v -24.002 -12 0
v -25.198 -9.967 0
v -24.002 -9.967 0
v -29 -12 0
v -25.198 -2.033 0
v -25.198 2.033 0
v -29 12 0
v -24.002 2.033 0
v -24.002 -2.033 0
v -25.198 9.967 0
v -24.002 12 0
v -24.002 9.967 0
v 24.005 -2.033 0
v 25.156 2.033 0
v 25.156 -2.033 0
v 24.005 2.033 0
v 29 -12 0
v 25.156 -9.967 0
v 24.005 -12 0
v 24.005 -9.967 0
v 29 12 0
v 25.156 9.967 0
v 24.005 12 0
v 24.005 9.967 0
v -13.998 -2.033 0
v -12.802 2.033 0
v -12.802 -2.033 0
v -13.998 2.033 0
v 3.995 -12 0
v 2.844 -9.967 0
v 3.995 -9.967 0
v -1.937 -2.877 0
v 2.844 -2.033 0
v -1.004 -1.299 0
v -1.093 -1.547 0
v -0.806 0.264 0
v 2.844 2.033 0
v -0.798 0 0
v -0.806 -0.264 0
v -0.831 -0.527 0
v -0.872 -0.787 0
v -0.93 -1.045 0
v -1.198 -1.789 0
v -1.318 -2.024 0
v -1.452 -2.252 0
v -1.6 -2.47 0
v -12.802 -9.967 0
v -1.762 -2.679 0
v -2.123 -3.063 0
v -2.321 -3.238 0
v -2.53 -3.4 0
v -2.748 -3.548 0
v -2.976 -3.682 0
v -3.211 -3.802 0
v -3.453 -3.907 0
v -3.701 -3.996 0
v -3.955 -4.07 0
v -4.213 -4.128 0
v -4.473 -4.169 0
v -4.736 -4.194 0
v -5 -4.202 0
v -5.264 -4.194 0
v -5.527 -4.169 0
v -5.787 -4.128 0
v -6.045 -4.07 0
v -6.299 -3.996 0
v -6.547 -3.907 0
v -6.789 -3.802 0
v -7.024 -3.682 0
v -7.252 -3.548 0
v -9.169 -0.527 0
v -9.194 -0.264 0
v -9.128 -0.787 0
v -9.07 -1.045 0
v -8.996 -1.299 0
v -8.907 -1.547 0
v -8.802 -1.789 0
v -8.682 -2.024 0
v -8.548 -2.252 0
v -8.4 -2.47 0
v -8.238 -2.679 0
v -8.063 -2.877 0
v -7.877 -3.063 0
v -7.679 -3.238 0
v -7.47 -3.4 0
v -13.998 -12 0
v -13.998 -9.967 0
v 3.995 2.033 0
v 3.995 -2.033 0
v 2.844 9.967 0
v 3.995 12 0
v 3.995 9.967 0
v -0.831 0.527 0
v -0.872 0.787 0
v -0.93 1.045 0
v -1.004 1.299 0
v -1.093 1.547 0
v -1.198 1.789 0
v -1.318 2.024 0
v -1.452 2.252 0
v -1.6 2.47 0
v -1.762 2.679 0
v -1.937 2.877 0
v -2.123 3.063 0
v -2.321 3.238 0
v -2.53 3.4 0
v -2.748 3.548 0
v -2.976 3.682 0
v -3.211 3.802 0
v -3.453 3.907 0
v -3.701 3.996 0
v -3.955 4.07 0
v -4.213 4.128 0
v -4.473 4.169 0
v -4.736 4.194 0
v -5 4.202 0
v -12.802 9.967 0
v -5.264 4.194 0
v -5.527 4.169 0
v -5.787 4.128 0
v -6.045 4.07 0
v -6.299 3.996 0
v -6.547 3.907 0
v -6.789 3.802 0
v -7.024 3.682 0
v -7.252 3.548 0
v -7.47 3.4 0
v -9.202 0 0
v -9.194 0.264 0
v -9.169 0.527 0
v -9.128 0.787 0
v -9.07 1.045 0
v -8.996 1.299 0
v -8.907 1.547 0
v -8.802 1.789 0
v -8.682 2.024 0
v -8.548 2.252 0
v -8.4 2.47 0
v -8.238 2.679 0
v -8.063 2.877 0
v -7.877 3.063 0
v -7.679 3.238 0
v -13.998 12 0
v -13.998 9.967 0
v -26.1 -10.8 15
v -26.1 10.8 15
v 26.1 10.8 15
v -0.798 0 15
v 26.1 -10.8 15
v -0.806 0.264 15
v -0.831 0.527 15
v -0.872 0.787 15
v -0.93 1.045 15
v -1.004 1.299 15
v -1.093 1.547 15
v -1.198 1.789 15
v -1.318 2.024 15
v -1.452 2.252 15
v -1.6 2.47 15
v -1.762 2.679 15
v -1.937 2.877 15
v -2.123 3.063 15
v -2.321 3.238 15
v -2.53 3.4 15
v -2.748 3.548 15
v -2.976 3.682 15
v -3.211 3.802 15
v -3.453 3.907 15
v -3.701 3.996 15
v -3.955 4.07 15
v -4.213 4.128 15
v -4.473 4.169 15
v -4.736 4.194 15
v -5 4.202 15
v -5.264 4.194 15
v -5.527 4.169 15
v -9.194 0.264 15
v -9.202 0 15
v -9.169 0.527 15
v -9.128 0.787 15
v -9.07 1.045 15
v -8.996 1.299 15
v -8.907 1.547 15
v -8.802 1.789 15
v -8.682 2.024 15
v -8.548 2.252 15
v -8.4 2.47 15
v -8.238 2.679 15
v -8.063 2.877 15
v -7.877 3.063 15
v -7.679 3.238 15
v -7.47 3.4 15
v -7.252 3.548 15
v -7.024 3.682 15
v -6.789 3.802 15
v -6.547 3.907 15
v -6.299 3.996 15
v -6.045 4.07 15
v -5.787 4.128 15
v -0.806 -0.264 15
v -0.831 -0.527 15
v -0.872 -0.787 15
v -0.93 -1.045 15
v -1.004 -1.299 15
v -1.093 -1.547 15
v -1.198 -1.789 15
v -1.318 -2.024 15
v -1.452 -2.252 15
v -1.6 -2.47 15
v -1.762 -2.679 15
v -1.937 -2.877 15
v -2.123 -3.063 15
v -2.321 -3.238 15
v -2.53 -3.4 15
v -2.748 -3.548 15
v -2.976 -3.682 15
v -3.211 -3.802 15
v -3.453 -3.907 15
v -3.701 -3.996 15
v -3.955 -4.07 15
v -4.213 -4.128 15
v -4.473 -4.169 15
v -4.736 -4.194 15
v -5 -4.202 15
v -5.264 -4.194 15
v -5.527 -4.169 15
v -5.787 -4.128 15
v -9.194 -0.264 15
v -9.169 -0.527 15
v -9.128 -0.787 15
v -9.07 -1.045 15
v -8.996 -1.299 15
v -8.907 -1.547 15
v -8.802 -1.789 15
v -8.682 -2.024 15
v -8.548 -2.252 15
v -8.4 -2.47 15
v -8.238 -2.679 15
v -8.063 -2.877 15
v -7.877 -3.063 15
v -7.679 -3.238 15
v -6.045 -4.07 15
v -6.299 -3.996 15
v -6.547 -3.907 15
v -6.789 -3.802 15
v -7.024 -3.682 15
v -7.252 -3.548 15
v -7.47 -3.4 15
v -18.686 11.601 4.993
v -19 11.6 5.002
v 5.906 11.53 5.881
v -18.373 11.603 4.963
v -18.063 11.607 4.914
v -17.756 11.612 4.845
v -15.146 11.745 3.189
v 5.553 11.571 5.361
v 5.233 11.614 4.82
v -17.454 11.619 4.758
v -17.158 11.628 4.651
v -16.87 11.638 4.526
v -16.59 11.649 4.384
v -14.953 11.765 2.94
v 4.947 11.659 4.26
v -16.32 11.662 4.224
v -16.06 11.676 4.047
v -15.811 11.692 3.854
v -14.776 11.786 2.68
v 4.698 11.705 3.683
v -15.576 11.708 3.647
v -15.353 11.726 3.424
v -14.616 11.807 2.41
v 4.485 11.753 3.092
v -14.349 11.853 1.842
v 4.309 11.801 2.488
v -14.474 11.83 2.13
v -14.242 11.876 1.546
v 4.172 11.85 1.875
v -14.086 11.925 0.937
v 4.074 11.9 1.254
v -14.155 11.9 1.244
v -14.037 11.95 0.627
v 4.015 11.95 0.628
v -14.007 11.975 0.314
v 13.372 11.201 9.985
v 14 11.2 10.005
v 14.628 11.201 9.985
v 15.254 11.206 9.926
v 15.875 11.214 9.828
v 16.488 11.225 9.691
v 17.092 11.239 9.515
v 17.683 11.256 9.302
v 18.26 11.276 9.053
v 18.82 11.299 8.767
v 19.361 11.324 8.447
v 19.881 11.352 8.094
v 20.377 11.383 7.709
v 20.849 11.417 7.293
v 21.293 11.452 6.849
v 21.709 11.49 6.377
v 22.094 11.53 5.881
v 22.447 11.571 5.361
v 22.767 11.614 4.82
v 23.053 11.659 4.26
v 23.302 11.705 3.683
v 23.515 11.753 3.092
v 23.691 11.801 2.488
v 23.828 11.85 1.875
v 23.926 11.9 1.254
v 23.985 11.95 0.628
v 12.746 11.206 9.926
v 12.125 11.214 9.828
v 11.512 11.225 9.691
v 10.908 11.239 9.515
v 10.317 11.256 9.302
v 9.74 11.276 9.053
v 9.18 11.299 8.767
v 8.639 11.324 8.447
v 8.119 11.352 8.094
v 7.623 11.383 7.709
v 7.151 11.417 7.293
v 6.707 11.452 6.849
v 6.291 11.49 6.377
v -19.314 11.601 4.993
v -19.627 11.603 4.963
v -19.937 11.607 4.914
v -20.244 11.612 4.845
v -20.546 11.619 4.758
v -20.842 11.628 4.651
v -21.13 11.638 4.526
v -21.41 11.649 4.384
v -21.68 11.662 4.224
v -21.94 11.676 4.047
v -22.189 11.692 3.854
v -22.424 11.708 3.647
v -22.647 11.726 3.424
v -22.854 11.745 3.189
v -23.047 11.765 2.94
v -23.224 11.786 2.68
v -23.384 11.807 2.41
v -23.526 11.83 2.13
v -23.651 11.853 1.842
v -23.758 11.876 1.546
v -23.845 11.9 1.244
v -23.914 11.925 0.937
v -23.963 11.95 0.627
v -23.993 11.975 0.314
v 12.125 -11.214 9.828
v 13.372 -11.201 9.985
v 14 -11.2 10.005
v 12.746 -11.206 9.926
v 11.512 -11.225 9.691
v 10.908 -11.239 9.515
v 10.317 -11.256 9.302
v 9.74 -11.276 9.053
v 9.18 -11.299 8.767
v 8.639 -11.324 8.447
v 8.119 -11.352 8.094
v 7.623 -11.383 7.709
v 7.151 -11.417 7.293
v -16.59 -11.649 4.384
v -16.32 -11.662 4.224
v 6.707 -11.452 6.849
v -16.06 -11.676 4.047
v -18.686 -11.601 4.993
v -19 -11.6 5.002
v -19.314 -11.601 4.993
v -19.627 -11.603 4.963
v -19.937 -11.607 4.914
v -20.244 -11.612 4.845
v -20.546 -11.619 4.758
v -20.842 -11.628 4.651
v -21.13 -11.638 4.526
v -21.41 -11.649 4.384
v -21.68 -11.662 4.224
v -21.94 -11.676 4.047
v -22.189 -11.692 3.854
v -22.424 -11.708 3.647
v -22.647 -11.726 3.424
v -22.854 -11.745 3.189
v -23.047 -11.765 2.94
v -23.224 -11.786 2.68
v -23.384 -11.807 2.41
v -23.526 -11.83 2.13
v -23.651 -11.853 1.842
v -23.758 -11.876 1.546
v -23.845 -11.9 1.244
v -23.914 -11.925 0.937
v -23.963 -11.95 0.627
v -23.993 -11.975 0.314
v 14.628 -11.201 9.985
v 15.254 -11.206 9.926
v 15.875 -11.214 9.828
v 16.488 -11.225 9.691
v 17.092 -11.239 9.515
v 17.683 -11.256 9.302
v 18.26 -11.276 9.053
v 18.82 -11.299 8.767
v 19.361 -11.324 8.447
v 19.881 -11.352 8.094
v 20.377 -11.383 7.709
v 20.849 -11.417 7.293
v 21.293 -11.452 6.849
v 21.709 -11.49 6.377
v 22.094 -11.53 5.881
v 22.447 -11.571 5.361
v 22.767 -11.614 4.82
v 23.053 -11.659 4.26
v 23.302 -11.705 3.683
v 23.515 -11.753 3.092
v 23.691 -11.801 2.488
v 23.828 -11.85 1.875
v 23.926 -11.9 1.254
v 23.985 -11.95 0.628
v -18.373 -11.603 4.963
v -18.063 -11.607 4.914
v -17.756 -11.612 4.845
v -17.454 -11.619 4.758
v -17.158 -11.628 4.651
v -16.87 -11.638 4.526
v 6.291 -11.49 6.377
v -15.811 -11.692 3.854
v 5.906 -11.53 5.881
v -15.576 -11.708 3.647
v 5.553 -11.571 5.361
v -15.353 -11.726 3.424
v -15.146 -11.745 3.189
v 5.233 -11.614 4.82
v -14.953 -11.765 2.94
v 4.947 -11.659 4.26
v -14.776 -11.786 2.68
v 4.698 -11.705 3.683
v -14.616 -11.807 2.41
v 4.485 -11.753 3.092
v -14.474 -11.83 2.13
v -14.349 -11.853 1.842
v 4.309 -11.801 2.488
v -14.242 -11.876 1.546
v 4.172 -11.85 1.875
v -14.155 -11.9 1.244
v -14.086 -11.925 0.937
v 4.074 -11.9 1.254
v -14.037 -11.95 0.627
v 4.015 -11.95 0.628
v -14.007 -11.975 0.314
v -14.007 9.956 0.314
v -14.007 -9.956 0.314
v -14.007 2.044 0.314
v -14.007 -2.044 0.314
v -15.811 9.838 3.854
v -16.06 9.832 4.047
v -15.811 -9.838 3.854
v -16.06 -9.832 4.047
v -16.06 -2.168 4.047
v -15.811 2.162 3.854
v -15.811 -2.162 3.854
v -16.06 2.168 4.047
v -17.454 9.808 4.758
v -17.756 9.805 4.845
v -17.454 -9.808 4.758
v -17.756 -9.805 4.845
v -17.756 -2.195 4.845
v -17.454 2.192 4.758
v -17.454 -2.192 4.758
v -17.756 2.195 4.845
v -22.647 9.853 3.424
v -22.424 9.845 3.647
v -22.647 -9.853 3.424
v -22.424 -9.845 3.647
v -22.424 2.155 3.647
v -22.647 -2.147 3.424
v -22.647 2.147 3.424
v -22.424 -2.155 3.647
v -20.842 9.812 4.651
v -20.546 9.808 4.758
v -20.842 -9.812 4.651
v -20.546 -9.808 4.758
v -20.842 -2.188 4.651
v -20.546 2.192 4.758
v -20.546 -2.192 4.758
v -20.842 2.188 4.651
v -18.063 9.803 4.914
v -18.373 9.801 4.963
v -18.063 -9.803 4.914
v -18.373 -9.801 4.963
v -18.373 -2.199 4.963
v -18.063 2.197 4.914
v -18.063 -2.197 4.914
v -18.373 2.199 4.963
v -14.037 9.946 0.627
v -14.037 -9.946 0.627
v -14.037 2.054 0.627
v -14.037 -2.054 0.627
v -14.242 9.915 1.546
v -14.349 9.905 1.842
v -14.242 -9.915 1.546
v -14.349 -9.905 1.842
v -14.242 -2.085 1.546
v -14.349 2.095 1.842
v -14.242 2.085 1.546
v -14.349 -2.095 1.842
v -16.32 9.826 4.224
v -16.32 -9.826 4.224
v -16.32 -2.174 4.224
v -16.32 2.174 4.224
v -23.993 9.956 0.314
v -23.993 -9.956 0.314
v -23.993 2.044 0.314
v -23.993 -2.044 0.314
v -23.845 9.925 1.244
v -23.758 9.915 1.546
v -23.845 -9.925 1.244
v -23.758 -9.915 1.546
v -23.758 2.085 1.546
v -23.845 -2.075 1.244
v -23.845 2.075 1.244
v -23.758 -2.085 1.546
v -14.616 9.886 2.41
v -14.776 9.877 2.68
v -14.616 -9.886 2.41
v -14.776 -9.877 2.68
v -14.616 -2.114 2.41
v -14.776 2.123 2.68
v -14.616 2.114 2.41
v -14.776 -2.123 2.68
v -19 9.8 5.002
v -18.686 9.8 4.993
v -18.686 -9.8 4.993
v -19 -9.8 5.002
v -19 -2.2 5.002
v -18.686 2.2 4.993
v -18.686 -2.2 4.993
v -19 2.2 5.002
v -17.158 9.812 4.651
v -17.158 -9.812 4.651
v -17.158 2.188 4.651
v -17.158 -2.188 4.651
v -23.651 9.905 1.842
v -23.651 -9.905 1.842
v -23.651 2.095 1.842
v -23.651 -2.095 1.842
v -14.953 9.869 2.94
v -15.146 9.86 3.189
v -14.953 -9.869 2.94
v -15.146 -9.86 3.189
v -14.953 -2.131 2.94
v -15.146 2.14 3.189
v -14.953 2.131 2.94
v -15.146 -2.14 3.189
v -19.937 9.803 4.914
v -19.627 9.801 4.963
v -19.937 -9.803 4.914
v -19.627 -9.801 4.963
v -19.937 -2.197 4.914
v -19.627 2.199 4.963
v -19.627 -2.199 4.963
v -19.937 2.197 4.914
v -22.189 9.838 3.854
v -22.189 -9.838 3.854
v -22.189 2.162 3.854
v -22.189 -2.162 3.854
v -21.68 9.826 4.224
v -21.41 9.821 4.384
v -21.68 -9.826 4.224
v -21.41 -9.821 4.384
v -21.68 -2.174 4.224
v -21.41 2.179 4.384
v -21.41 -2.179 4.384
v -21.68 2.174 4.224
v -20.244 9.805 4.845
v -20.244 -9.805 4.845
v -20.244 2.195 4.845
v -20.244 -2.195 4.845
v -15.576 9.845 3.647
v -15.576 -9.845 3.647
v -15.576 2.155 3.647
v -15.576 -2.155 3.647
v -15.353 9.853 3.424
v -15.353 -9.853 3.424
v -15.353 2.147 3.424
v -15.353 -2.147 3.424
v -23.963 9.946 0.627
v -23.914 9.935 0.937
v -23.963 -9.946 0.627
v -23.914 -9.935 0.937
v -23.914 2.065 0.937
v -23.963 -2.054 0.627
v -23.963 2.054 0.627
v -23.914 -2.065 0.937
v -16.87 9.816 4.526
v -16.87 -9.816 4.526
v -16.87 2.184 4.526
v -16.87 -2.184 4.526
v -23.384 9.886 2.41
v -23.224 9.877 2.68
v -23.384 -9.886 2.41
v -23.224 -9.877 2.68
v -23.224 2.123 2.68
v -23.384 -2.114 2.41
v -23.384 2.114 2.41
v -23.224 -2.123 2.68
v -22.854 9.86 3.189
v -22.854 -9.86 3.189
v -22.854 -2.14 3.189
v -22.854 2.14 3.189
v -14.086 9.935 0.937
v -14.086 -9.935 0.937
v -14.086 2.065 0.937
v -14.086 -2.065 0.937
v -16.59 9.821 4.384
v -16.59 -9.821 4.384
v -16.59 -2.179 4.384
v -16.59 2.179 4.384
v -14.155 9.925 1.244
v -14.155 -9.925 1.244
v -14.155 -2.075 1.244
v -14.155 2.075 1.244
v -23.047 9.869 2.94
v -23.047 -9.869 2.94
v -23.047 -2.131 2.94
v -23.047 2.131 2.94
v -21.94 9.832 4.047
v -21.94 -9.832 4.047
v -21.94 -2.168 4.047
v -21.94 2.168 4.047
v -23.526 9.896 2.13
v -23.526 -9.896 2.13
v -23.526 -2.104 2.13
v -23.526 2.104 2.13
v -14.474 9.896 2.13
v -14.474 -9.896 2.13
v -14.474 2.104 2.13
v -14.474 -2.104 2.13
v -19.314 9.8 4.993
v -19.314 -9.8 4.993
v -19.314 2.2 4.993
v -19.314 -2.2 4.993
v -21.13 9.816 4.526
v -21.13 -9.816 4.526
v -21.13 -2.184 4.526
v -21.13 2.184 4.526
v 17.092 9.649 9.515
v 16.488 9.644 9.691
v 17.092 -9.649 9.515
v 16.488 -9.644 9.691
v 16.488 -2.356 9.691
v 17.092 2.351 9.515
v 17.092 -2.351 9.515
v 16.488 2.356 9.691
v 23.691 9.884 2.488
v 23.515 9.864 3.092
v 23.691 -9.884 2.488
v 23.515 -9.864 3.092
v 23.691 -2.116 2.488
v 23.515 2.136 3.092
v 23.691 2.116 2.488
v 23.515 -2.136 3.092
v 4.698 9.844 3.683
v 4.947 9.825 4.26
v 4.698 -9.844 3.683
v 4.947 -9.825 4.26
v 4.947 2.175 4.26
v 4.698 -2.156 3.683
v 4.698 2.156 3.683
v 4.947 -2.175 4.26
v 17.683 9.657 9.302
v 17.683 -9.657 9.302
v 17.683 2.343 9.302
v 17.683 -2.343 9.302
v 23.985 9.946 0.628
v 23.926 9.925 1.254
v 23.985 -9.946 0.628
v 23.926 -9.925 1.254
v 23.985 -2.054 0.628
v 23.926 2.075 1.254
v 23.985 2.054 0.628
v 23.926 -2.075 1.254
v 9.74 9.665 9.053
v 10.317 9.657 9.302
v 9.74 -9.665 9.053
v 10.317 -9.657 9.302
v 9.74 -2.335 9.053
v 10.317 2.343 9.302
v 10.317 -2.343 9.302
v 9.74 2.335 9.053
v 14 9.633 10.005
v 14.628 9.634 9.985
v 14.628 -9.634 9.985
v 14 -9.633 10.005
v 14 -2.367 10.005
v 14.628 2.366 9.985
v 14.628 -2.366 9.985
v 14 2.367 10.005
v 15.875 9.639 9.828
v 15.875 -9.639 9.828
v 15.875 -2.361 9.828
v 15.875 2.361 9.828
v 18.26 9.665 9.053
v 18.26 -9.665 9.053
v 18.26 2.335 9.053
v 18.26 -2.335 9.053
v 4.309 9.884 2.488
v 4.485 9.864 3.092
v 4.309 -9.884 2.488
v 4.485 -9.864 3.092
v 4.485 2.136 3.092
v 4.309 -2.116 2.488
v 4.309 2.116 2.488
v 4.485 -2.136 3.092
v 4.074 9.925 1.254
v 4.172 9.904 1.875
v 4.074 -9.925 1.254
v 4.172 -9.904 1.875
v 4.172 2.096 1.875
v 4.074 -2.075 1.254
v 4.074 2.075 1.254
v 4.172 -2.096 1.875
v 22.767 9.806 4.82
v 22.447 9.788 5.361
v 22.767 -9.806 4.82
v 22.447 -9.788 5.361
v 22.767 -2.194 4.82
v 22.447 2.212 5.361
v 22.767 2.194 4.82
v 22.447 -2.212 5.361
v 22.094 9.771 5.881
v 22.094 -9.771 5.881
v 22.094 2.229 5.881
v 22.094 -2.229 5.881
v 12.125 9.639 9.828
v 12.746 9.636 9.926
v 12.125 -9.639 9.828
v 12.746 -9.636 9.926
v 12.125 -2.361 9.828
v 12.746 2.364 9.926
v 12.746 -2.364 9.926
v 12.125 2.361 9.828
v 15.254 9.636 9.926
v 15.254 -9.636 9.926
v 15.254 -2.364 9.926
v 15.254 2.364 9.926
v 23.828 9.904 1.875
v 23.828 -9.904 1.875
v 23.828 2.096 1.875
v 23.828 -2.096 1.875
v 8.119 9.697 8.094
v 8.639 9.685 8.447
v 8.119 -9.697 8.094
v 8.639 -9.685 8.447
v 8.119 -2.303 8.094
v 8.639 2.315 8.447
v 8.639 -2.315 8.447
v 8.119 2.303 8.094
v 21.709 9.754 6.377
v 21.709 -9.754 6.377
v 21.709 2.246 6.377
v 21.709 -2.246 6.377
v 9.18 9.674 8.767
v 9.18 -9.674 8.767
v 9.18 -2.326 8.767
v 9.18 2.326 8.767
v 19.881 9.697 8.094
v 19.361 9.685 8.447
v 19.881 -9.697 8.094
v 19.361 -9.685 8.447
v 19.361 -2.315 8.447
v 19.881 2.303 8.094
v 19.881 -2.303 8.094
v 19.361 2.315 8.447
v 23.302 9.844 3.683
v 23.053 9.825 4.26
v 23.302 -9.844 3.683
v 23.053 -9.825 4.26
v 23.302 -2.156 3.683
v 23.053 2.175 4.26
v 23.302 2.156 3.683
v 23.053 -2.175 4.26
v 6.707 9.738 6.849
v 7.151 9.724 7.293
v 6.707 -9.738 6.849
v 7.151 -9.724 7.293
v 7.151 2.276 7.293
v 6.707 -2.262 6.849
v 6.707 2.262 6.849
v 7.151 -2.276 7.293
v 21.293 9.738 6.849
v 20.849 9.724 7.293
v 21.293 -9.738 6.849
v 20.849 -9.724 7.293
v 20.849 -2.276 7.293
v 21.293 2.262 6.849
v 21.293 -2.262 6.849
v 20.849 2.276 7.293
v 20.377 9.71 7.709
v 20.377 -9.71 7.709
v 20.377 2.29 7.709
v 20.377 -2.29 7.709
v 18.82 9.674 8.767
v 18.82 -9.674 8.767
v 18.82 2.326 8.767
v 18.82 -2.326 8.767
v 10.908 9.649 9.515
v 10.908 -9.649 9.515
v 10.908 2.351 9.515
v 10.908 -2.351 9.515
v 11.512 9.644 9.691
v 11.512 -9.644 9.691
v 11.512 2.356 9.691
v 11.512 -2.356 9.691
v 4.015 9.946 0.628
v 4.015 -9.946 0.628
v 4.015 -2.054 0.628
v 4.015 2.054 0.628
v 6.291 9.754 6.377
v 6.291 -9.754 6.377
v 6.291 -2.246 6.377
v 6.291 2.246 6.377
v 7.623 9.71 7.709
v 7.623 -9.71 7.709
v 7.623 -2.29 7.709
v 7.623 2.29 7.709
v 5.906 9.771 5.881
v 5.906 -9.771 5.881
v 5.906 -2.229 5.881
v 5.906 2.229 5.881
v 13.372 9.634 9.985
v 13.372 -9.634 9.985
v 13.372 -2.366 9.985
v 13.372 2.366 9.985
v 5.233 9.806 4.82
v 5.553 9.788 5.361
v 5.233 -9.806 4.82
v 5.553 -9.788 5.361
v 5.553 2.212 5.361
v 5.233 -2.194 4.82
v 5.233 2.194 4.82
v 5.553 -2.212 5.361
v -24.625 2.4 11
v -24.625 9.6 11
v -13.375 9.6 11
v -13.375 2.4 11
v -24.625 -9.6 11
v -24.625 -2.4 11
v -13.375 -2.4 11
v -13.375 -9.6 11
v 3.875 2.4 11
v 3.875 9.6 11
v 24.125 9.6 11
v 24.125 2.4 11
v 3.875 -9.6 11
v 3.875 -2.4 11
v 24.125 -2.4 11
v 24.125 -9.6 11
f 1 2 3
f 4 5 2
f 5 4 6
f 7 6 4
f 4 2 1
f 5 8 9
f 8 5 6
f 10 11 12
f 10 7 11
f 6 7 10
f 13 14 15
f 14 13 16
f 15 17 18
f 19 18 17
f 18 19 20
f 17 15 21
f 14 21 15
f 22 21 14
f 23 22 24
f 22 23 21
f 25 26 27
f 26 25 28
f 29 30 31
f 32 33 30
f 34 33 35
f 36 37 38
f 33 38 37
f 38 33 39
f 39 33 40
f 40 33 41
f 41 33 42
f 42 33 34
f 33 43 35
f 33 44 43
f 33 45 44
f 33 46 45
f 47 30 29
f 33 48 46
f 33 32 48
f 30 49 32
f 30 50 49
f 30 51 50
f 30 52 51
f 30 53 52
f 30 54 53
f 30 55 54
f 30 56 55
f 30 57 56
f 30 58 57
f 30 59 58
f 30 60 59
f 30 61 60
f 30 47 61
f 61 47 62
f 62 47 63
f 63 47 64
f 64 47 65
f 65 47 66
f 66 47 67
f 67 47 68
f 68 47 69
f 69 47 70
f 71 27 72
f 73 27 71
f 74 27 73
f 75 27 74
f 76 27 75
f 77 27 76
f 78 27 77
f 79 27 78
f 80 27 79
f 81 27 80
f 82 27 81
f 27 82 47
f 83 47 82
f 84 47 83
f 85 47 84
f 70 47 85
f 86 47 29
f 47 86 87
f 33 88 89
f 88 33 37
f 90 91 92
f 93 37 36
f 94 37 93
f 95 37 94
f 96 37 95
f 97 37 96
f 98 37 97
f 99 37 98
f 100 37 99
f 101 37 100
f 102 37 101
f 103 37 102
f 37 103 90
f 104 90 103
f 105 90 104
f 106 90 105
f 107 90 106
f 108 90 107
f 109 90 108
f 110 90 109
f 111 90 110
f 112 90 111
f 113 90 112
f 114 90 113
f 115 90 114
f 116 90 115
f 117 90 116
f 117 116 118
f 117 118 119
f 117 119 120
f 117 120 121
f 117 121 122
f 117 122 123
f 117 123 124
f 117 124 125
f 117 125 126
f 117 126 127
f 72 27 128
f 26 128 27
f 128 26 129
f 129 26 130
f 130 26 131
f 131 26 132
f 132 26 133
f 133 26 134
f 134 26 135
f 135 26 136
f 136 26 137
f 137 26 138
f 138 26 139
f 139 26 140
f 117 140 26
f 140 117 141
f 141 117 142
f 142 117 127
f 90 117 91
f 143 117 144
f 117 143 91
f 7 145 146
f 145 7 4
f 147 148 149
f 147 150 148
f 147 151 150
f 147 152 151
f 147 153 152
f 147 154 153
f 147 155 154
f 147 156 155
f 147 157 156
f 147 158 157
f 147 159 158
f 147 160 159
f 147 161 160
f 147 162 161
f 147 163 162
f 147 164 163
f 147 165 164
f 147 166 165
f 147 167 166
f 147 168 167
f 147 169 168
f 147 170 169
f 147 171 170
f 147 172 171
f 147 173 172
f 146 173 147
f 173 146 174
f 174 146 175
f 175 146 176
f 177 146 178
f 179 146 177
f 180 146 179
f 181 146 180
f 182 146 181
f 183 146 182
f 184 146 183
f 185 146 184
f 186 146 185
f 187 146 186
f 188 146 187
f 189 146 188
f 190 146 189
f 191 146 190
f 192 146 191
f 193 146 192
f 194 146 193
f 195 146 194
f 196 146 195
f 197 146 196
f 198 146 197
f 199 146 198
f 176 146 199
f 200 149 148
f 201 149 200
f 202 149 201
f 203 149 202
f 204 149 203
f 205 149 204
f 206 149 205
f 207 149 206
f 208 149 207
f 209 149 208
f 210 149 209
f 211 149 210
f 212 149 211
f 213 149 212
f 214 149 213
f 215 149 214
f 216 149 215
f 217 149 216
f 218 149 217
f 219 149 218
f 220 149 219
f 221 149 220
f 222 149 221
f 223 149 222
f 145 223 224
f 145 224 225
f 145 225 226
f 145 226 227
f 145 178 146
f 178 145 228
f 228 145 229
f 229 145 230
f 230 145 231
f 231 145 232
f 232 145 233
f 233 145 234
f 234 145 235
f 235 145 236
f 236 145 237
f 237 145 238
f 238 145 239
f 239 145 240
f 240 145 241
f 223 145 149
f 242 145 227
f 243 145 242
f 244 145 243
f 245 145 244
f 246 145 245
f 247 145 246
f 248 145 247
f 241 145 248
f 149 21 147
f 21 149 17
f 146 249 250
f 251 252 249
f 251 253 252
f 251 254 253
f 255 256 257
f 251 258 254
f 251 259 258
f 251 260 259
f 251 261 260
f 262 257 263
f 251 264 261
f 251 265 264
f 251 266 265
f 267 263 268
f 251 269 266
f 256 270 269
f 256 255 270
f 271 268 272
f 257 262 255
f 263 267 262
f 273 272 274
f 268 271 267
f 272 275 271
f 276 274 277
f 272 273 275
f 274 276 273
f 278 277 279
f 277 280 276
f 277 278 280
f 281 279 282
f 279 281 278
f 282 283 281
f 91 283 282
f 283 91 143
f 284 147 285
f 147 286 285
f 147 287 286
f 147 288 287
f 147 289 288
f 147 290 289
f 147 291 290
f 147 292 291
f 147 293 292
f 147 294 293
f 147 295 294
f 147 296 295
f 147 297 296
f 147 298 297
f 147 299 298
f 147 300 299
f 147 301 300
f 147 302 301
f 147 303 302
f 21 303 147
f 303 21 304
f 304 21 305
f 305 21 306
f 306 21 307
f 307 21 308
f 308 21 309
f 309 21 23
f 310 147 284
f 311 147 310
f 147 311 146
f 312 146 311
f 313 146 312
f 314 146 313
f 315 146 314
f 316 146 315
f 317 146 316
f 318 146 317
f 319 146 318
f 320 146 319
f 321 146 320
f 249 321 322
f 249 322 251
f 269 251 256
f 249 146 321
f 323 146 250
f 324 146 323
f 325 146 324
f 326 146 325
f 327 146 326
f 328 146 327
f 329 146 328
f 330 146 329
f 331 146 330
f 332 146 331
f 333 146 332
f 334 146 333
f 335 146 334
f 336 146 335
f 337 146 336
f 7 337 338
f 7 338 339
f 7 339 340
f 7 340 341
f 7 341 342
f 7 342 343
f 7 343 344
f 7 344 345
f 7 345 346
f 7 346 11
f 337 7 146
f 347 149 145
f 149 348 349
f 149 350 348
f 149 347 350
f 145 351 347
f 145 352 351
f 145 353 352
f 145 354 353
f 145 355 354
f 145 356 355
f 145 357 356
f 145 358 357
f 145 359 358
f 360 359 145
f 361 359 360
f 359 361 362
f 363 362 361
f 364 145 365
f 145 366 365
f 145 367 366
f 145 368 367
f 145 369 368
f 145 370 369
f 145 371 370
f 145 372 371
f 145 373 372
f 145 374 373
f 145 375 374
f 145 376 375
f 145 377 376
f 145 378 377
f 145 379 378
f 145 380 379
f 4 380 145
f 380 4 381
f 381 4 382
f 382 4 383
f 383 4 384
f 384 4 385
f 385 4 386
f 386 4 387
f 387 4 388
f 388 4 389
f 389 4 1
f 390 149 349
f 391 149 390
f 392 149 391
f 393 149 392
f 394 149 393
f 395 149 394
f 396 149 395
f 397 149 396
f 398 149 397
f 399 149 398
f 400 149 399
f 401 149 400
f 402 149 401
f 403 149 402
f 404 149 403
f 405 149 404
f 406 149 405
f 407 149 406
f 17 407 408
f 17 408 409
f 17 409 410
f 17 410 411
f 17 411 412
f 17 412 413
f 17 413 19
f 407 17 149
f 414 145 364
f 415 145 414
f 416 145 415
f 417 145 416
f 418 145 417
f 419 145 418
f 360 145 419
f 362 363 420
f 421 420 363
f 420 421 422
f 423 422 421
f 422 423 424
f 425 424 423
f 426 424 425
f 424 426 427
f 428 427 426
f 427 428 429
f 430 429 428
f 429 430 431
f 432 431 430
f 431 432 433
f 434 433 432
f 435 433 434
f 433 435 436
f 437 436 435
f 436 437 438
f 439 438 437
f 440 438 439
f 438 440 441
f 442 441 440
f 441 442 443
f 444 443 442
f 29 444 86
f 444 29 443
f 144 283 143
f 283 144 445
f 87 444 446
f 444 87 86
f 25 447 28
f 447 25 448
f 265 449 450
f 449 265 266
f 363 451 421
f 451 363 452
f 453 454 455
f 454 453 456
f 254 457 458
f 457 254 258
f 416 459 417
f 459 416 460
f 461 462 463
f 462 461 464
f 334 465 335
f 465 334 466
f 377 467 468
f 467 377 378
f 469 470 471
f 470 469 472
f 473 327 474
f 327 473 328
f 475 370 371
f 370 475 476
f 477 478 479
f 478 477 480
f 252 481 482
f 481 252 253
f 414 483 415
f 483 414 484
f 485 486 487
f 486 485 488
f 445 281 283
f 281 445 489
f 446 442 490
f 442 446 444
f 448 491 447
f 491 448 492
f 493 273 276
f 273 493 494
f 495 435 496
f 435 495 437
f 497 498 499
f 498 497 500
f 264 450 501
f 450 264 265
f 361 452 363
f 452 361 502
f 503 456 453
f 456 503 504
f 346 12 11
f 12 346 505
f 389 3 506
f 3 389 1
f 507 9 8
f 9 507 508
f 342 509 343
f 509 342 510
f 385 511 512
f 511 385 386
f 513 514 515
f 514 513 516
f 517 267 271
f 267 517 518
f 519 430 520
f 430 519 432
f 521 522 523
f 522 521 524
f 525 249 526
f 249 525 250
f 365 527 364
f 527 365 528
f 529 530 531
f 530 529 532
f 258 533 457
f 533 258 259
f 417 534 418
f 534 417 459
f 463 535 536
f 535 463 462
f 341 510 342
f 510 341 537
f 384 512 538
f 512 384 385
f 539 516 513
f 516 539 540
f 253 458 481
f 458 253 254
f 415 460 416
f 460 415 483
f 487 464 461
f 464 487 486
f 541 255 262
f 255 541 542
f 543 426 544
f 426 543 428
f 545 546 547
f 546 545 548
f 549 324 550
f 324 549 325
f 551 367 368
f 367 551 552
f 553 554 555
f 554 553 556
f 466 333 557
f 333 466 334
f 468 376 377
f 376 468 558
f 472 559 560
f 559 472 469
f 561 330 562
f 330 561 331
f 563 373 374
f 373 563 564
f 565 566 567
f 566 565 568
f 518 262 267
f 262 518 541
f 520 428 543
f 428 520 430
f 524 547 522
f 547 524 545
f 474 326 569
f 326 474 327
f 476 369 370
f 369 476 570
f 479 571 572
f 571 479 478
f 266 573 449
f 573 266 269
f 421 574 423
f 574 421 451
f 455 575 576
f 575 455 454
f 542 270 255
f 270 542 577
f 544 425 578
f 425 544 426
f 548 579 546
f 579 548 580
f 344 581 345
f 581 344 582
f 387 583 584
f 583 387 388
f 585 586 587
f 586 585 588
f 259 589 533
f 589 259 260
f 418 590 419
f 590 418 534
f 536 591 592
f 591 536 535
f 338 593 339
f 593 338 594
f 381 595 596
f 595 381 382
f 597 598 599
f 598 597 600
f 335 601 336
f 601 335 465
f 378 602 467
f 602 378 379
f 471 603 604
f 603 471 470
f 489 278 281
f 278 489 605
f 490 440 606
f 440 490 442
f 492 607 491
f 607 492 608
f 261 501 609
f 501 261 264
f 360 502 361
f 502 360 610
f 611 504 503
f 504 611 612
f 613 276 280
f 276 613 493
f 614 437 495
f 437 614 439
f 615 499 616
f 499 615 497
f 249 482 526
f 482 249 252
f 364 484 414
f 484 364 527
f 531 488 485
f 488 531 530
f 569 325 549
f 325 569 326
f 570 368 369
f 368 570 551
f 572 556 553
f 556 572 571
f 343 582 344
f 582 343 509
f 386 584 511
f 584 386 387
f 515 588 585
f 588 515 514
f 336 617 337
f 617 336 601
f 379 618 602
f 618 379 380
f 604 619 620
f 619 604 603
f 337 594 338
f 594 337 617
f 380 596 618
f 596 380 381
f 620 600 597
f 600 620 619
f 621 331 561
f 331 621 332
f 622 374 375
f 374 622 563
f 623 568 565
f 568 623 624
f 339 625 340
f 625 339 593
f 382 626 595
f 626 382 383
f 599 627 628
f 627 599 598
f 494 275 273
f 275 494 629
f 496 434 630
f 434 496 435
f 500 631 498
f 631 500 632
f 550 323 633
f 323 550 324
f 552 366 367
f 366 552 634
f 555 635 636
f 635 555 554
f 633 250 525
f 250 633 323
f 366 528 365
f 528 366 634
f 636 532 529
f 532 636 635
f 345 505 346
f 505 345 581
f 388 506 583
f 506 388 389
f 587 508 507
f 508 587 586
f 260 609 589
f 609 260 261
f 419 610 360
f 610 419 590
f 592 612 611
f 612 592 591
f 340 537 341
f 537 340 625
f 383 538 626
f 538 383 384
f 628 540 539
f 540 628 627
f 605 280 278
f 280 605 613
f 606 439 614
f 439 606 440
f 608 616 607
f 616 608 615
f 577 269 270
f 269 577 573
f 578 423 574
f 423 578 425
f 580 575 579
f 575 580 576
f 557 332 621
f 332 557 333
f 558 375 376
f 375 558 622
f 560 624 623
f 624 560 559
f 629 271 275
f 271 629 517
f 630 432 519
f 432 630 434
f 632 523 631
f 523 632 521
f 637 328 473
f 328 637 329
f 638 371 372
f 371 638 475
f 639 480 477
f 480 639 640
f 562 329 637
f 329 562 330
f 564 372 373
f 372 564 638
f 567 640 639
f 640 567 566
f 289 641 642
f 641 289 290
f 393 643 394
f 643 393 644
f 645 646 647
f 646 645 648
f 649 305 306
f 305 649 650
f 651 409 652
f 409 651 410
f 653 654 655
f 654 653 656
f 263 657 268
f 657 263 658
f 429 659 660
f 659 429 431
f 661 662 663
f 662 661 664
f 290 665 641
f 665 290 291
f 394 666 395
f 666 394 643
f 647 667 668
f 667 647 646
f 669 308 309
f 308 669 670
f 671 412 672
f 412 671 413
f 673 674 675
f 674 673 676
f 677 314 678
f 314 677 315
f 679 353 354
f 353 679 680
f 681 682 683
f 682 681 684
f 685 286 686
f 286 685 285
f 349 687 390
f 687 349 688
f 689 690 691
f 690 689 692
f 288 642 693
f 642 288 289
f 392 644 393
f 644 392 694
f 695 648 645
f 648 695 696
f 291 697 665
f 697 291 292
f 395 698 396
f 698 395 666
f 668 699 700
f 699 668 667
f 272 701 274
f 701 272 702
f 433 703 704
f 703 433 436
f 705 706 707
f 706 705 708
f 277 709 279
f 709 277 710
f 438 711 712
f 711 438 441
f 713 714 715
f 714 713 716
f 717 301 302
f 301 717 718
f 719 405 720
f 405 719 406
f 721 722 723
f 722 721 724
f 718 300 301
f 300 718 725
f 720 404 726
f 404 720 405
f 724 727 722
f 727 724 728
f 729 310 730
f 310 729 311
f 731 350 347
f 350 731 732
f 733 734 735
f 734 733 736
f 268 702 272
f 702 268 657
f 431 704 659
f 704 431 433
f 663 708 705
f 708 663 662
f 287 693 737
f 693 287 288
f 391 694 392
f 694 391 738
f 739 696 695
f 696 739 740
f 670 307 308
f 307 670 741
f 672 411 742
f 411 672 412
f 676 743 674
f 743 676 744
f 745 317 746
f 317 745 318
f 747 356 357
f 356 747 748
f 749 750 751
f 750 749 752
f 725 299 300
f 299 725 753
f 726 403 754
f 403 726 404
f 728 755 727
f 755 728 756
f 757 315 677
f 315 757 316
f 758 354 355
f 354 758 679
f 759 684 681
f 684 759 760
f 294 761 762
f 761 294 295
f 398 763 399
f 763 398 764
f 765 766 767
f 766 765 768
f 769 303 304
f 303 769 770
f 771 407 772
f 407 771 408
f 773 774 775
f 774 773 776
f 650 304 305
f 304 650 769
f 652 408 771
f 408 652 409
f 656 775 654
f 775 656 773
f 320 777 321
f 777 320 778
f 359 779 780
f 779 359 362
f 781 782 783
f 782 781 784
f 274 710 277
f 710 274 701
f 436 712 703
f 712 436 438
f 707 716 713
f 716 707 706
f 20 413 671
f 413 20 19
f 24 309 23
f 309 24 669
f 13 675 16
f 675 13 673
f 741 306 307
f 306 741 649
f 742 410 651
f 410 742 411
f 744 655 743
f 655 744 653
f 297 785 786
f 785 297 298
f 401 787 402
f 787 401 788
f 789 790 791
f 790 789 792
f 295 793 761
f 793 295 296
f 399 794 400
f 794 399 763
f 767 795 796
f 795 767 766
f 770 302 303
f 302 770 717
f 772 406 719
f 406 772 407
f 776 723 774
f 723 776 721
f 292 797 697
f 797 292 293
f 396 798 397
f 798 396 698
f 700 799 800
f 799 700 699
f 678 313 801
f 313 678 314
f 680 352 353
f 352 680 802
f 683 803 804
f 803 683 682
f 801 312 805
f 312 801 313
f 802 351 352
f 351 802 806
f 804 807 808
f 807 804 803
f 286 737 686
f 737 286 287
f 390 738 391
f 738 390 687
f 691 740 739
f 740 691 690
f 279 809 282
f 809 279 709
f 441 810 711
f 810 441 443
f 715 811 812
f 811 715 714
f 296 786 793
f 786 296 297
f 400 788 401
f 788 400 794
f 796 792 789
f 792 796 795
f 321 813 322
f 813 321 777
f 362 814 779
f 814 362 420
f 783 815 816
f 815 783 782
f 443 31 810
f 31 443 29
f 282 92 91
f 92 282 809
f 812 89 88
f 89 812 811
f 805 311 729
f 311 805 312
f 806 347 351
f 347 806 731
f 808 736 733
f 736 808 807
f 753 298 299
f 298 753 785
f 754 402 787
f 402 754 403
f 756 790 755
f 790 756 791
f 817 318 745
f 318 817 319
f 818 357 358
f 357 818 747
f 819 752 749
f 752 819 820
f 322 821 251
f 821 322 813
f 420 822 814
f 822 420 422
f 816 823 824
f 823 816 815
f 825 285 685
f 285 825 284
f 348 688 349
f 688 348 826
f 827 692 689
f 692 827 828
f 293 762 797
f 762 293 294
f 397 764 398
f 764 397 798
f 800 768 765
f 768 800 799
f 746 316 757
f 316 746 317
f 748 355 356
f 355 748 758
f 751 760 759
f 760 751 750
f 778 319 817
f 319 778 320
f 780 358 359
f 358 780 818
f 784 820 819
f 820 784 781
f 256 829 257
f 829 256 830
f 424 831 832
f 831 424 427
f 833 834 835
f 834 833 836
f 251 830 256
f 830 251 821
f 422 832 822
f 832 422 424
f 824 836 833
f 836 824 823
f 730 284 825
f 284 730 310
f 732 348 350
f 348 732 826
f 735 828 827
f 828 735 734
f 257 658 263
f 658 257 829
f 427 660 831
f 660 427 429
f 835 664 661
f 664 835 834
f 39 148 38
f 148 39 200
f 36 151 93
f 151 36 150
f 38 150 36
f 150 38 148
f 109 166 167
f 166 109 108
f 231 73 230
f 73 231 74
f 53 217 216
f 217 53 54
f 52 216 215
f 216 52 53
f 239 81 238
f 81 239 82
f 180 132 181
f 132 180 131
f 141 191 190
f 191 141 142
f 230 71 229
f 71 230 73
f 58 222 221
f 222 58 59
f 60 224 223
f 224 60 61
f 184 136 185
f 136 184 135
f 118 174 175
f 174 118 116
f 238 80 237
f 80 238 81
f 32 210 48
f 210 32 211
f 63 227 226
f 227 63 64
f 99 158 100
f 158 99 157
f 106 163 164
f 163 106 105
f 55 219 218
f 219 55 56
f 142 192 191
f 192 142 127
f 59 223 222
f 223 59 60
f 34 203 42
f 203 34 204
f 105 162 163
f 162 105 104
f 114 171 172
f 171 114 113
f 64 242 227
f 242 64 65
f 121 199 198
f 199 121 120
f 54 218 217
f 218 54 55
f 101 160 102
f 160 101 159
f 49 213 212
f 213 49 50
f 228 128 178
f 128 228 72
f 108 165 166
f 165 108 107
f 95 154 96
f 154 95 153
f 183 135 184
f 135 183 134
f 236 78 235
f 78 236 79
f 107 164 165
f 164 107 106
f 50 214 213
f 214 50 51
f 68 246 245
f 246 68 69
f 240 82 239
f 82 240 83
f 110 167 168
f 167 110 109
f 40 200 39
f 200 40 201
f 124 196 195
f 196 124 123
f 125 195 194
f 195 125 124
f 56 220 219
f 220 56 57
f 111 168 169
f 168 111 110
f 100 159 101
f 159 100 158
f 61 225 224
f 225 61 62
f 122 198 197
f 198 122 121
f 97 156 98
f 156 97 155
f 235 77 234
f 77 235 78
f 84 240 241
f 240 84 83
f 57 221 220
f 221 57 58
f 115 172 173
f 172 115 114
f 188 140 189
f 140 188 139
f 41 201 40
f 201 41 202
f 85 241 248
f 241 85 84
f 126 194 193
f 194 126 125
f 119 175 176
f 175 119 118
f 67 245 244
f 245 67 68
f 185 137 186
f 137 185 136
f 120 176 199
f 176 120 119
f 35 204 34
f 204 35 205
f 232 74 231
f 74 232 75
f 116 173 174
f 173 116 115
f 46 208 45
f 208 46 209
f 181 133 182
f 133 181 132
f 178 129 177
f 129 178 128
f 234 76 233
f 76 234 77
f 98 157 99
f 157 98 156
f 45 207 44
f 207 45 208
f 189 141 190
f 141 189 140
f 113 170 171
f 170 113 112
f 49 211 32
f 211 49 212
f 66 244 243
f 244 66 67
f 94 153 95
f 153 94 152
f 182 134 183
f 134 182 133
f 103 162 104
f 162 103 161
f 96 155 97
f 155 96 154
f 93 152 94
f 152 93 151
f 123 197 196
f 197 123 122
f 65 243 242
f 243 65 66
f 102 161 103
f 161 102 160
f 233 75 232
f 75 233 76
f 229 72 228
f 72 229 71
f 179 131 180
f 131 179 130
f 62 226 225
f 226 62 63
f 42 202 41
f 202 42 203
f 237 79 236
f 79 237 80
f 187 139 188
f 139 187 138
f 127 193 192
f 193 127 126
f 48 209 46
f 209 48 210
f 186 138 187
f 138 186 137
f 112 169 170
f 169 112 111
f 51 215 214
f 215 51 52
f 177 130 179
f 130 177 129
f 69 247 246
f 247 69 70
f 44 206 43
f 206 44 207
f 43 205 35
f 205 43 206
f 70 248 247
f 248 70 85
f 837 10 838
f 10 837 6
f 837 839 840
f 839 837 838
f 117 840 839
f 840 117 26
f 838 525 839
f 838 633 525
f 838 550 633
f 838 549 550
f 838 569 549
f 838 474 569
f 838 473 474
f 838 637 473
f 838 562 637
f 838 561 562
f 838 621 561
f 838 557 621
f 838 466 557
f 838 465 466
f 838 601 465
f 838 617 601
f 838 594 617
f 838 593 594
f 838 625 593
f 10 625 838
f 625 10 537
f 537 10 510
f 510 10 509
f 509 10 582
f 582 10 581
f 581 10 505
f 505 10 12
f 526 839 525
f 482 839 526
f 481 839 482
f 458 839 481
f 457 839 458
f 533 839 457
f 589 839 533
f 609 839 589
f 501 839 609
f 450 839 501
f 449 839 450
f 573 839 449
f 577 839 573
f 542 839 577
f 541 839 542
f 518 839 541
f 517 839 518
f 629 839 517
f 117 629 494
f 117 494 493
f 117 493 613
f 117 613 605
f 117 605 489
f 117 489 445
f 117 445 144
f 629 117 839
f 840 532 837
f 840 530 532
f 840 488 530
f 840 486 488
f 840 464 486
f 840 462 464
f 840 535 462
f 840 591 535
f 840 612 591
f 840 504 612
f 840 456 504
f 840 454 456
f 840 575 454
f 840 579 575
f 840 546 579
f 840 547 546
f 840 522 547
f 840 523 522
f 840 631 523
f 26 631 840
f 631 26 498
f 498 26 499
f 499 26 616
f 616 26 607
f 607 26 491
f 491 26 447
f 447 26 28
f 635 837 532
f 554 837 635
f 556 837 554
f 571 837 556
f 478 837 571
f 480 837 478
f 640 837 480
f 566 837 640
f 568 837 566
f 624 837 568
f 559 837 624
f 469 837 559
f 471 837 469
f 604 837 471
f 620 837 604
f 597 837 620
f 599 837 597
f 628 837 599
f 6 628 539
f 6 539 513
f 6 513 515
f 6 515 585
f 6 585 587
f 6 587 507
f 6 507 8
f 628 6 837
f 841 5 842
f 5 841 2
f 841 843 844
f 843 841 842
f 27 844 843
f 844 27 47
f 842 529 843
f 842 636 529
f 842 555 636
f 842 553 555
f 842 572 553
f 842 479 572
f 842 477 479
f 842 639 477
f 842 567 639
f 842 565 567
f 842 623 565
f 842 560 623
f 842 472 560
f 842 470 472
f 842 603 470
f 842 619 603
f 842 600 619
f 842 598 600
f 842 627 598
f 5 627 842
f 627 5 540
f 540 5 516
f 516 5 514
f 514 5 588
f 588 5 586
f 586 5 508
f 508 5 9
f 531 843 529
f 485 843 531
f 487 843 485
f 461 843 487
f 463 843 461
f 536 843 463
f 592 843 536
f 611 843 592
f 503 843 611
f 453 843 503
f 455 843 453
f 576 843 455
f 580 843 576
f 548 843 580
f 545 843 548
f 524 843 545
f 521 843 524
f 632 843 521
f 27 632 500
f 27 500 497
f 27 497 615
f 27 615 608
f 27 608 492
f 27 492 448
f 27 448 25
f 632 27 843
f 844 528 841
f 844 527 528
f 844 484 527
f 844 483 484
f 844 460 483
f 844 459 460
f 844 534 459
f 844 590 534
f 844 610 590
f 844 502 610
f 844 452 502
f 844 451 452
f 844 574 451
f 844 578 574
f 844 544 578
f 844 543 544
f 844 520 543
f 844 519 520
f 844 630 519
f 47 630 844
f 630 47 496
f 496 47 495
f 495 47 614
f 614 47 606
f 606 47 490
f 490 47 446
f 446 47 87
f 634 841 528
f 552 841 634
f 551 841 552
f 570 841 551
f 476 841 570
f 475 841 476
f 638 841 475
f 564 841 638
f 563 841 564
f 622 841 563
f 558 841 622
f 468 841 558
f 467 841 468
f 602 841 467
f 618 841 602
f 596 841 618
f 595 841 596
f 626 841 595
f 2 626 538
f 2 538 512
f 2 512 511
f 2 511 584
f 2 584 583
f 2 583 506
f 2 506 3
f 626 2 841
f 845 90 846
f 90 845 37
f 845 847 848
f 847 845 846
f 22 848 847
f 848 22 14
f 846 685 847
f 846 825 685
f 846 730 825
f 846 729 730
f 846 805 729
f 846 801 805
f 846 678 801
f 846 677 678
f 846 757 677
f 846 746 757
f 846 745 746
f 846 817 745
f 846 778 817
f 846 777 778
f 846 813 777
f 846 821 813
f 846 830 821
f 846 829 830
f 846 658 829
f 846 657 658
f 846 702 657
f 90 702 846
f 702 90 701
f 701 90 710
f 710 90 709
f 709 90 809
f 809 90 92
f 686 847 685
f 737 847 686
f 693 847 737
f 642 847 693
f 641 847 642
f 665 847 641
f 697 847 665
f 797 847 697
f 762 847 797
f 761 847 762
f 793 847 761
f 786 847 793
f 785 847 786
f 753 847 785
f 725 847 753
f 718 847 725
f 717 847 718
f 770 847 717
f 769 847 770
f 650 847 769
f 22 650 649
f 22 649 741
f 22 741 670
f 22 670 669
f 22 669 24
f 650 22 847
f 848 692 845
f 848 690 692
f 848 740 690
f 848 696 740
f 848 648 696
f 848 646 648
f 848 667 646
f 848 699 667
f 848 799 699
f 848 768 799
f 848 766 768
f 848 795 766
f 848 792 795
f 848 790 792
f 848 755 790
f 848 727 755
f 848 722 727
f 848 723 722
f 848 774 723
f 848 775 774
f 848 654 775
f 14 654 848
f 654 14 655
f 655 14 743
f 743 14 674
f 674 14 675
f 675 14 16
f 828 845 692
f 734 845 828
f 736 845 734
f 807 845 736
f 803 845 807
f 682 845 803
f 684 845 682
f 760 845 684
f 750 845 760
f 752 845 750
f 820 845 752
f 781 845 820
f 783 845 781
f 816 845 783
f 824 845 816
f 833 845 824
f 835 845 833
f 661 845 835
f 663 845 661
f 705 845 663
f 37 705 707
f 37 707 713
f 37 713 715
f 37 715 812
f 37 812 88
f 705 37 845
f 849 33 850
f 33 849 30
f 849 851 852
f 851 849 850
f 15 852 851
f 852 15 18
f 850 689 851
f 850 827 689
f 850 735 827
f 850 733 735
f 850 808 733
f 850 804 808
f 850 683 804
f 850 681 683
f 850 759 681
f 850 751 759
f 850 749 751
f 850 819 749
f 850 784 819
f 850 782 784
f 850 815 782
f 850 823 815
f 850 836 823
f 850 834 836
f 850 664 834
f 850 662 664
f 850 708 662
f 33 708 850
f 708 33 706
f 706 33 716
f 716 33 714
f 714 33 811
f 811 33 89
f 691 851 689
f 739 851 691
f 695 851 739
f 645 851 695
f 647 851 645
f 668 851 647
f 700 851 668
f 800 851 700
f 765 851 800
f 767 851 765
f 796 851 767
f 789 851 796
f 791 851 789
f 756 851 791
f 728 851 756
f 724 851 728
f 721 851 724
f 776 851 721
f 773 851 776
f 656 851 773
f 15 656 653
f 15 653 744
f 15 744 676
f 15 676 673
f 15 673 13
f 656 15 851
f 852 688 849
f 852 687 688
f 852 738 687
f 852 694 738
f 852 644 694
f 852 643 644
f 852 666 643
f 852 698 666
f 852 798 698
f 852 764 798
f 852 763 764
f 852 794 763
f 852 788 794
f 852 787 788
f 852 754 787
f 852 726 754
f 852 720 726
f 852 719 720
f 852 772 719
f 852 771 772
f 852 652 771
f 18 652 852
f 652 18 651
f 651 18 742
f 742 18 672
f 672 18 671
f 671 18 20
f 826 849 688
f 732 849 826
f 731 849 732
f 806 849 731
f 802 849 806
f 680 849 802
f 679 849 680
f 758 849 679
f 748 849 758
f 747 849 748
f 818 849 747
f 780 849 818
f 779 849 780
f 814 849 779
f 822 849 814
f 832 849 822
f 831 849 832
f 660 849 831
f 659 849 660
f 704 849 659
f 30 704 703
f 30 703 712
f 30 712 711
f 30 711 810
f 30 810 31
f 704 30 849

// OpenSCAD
// Copyright (c) 2017 Matt Woodhead
//
// V1.0 - Original

echo(version=version());

/* [Dimensions] */
// Hose 1 Outer Diameter (mm)
DIA_1 = 10; //

// Hose 2 Outer Diameter (mm)
DIA_2 = 20; //

// Hose clamp depth (mm)
depth = 24; //

// Fastening screw diameter (mm)
screw_dia = 8; //

// Fastening screw clearance diameter increase (mm)
screw_clearance = 0.4;

// Maximum wall thickness either side of the hose hole (mm)
wall_t = 5; //

/* [Hidden] */
// ~~~~~~~~~~~~~~~~~~~~~~~~~~~~~~~~ Main ~~~~~~~~~~~~~~~~~~~~~~~~~~~~~~~~~~

// Module to account for undersized holes produced by polygon estimation
 module cylinder_outer(radius, height, center_req=true, fn=100){
   fudge = 1/cos(180/fn);
   cylinder(h=height, r=radius*fudge, $fn=fn, center=center_req);
}


// Overall dimensions
WIDTH = (4*wall_t)+DIA_1+screw_dia+DIA_2;
echo("Width: ",WIDTH,"mm");
HEIGHT = 0.75*max(DIA_1, DIA_2);
echo("Height: ",HEIGHT,"mm");

// Hole positions
MAX_HOLE = max(DIA_1, DIA_2);
HOLE_1_POS = -1*((WIDTH/2) - (DIA_1/2) - wall_t);
HOLE_2_POS = (WIDTH/2) - (DIA_2/2) - wall_t;
BOLT_HOLE_POS = -1*((WIDTH/2) - DIA_1 - (2*wall_t) - (screw_dia/2));


// Create geometry
difference(){
    linear_extrude(height=HEIGHT, scale=0.9)
        square([WIDTH, depth], center=true);

    // Extrude first hose hole
    translate([HOLE_1_POS, 0, 0])
        rotate([-90,0,0])
            cylinder_outer(radius=DIA_1/2, height=depth+1);
    
    // Extrude second hose hole
    translate([HOLE_2_POS, 0, 0])
        rotate([-90,0,0])
            cylinder_outer(radius=DIA_2/2, height=depth+1);

    // Extrude mounting bolt hole
    translate([BOLT_HOLE_POS, 0, -1])
    rotate([0,0,0])
        cylinder_outer(radius=(screw_dia+screw_clearance)/2, height=HEIGHT+1+1, center_req=false);
    
    // Hollows to save plastic
    translate([HOLE_1_POS, depth/4, -1])
        linear_extrude(height=(MAX_HOLE/2)+2, scale=0.9)
            square([DIA_1+wall_t/2, depth/3], center=true);
    translate([HOLE_1_POS, -depth/4, -1])
        linear_extrude(height=(MAX_HOLE/2)+2, scale=0.9)
            square([DIA_1+wall_t/2, depth/3], center=true);
    translate([HOLE_2_POS, depth/4, -1])
        linear_extrude(height=(MAX_HOLE/2)+2, scale=0.9)
            square([DIA_2+wall_t/2, depth/3], center=true);
    translate([HOLE_2_POS, -depth/4, -1])
        linear_extrude(height=(MAX_HOLE/2)+2, scale=0.9)
            square([DIA_2+wall_t/2, depth/3], center=true);
}
    
